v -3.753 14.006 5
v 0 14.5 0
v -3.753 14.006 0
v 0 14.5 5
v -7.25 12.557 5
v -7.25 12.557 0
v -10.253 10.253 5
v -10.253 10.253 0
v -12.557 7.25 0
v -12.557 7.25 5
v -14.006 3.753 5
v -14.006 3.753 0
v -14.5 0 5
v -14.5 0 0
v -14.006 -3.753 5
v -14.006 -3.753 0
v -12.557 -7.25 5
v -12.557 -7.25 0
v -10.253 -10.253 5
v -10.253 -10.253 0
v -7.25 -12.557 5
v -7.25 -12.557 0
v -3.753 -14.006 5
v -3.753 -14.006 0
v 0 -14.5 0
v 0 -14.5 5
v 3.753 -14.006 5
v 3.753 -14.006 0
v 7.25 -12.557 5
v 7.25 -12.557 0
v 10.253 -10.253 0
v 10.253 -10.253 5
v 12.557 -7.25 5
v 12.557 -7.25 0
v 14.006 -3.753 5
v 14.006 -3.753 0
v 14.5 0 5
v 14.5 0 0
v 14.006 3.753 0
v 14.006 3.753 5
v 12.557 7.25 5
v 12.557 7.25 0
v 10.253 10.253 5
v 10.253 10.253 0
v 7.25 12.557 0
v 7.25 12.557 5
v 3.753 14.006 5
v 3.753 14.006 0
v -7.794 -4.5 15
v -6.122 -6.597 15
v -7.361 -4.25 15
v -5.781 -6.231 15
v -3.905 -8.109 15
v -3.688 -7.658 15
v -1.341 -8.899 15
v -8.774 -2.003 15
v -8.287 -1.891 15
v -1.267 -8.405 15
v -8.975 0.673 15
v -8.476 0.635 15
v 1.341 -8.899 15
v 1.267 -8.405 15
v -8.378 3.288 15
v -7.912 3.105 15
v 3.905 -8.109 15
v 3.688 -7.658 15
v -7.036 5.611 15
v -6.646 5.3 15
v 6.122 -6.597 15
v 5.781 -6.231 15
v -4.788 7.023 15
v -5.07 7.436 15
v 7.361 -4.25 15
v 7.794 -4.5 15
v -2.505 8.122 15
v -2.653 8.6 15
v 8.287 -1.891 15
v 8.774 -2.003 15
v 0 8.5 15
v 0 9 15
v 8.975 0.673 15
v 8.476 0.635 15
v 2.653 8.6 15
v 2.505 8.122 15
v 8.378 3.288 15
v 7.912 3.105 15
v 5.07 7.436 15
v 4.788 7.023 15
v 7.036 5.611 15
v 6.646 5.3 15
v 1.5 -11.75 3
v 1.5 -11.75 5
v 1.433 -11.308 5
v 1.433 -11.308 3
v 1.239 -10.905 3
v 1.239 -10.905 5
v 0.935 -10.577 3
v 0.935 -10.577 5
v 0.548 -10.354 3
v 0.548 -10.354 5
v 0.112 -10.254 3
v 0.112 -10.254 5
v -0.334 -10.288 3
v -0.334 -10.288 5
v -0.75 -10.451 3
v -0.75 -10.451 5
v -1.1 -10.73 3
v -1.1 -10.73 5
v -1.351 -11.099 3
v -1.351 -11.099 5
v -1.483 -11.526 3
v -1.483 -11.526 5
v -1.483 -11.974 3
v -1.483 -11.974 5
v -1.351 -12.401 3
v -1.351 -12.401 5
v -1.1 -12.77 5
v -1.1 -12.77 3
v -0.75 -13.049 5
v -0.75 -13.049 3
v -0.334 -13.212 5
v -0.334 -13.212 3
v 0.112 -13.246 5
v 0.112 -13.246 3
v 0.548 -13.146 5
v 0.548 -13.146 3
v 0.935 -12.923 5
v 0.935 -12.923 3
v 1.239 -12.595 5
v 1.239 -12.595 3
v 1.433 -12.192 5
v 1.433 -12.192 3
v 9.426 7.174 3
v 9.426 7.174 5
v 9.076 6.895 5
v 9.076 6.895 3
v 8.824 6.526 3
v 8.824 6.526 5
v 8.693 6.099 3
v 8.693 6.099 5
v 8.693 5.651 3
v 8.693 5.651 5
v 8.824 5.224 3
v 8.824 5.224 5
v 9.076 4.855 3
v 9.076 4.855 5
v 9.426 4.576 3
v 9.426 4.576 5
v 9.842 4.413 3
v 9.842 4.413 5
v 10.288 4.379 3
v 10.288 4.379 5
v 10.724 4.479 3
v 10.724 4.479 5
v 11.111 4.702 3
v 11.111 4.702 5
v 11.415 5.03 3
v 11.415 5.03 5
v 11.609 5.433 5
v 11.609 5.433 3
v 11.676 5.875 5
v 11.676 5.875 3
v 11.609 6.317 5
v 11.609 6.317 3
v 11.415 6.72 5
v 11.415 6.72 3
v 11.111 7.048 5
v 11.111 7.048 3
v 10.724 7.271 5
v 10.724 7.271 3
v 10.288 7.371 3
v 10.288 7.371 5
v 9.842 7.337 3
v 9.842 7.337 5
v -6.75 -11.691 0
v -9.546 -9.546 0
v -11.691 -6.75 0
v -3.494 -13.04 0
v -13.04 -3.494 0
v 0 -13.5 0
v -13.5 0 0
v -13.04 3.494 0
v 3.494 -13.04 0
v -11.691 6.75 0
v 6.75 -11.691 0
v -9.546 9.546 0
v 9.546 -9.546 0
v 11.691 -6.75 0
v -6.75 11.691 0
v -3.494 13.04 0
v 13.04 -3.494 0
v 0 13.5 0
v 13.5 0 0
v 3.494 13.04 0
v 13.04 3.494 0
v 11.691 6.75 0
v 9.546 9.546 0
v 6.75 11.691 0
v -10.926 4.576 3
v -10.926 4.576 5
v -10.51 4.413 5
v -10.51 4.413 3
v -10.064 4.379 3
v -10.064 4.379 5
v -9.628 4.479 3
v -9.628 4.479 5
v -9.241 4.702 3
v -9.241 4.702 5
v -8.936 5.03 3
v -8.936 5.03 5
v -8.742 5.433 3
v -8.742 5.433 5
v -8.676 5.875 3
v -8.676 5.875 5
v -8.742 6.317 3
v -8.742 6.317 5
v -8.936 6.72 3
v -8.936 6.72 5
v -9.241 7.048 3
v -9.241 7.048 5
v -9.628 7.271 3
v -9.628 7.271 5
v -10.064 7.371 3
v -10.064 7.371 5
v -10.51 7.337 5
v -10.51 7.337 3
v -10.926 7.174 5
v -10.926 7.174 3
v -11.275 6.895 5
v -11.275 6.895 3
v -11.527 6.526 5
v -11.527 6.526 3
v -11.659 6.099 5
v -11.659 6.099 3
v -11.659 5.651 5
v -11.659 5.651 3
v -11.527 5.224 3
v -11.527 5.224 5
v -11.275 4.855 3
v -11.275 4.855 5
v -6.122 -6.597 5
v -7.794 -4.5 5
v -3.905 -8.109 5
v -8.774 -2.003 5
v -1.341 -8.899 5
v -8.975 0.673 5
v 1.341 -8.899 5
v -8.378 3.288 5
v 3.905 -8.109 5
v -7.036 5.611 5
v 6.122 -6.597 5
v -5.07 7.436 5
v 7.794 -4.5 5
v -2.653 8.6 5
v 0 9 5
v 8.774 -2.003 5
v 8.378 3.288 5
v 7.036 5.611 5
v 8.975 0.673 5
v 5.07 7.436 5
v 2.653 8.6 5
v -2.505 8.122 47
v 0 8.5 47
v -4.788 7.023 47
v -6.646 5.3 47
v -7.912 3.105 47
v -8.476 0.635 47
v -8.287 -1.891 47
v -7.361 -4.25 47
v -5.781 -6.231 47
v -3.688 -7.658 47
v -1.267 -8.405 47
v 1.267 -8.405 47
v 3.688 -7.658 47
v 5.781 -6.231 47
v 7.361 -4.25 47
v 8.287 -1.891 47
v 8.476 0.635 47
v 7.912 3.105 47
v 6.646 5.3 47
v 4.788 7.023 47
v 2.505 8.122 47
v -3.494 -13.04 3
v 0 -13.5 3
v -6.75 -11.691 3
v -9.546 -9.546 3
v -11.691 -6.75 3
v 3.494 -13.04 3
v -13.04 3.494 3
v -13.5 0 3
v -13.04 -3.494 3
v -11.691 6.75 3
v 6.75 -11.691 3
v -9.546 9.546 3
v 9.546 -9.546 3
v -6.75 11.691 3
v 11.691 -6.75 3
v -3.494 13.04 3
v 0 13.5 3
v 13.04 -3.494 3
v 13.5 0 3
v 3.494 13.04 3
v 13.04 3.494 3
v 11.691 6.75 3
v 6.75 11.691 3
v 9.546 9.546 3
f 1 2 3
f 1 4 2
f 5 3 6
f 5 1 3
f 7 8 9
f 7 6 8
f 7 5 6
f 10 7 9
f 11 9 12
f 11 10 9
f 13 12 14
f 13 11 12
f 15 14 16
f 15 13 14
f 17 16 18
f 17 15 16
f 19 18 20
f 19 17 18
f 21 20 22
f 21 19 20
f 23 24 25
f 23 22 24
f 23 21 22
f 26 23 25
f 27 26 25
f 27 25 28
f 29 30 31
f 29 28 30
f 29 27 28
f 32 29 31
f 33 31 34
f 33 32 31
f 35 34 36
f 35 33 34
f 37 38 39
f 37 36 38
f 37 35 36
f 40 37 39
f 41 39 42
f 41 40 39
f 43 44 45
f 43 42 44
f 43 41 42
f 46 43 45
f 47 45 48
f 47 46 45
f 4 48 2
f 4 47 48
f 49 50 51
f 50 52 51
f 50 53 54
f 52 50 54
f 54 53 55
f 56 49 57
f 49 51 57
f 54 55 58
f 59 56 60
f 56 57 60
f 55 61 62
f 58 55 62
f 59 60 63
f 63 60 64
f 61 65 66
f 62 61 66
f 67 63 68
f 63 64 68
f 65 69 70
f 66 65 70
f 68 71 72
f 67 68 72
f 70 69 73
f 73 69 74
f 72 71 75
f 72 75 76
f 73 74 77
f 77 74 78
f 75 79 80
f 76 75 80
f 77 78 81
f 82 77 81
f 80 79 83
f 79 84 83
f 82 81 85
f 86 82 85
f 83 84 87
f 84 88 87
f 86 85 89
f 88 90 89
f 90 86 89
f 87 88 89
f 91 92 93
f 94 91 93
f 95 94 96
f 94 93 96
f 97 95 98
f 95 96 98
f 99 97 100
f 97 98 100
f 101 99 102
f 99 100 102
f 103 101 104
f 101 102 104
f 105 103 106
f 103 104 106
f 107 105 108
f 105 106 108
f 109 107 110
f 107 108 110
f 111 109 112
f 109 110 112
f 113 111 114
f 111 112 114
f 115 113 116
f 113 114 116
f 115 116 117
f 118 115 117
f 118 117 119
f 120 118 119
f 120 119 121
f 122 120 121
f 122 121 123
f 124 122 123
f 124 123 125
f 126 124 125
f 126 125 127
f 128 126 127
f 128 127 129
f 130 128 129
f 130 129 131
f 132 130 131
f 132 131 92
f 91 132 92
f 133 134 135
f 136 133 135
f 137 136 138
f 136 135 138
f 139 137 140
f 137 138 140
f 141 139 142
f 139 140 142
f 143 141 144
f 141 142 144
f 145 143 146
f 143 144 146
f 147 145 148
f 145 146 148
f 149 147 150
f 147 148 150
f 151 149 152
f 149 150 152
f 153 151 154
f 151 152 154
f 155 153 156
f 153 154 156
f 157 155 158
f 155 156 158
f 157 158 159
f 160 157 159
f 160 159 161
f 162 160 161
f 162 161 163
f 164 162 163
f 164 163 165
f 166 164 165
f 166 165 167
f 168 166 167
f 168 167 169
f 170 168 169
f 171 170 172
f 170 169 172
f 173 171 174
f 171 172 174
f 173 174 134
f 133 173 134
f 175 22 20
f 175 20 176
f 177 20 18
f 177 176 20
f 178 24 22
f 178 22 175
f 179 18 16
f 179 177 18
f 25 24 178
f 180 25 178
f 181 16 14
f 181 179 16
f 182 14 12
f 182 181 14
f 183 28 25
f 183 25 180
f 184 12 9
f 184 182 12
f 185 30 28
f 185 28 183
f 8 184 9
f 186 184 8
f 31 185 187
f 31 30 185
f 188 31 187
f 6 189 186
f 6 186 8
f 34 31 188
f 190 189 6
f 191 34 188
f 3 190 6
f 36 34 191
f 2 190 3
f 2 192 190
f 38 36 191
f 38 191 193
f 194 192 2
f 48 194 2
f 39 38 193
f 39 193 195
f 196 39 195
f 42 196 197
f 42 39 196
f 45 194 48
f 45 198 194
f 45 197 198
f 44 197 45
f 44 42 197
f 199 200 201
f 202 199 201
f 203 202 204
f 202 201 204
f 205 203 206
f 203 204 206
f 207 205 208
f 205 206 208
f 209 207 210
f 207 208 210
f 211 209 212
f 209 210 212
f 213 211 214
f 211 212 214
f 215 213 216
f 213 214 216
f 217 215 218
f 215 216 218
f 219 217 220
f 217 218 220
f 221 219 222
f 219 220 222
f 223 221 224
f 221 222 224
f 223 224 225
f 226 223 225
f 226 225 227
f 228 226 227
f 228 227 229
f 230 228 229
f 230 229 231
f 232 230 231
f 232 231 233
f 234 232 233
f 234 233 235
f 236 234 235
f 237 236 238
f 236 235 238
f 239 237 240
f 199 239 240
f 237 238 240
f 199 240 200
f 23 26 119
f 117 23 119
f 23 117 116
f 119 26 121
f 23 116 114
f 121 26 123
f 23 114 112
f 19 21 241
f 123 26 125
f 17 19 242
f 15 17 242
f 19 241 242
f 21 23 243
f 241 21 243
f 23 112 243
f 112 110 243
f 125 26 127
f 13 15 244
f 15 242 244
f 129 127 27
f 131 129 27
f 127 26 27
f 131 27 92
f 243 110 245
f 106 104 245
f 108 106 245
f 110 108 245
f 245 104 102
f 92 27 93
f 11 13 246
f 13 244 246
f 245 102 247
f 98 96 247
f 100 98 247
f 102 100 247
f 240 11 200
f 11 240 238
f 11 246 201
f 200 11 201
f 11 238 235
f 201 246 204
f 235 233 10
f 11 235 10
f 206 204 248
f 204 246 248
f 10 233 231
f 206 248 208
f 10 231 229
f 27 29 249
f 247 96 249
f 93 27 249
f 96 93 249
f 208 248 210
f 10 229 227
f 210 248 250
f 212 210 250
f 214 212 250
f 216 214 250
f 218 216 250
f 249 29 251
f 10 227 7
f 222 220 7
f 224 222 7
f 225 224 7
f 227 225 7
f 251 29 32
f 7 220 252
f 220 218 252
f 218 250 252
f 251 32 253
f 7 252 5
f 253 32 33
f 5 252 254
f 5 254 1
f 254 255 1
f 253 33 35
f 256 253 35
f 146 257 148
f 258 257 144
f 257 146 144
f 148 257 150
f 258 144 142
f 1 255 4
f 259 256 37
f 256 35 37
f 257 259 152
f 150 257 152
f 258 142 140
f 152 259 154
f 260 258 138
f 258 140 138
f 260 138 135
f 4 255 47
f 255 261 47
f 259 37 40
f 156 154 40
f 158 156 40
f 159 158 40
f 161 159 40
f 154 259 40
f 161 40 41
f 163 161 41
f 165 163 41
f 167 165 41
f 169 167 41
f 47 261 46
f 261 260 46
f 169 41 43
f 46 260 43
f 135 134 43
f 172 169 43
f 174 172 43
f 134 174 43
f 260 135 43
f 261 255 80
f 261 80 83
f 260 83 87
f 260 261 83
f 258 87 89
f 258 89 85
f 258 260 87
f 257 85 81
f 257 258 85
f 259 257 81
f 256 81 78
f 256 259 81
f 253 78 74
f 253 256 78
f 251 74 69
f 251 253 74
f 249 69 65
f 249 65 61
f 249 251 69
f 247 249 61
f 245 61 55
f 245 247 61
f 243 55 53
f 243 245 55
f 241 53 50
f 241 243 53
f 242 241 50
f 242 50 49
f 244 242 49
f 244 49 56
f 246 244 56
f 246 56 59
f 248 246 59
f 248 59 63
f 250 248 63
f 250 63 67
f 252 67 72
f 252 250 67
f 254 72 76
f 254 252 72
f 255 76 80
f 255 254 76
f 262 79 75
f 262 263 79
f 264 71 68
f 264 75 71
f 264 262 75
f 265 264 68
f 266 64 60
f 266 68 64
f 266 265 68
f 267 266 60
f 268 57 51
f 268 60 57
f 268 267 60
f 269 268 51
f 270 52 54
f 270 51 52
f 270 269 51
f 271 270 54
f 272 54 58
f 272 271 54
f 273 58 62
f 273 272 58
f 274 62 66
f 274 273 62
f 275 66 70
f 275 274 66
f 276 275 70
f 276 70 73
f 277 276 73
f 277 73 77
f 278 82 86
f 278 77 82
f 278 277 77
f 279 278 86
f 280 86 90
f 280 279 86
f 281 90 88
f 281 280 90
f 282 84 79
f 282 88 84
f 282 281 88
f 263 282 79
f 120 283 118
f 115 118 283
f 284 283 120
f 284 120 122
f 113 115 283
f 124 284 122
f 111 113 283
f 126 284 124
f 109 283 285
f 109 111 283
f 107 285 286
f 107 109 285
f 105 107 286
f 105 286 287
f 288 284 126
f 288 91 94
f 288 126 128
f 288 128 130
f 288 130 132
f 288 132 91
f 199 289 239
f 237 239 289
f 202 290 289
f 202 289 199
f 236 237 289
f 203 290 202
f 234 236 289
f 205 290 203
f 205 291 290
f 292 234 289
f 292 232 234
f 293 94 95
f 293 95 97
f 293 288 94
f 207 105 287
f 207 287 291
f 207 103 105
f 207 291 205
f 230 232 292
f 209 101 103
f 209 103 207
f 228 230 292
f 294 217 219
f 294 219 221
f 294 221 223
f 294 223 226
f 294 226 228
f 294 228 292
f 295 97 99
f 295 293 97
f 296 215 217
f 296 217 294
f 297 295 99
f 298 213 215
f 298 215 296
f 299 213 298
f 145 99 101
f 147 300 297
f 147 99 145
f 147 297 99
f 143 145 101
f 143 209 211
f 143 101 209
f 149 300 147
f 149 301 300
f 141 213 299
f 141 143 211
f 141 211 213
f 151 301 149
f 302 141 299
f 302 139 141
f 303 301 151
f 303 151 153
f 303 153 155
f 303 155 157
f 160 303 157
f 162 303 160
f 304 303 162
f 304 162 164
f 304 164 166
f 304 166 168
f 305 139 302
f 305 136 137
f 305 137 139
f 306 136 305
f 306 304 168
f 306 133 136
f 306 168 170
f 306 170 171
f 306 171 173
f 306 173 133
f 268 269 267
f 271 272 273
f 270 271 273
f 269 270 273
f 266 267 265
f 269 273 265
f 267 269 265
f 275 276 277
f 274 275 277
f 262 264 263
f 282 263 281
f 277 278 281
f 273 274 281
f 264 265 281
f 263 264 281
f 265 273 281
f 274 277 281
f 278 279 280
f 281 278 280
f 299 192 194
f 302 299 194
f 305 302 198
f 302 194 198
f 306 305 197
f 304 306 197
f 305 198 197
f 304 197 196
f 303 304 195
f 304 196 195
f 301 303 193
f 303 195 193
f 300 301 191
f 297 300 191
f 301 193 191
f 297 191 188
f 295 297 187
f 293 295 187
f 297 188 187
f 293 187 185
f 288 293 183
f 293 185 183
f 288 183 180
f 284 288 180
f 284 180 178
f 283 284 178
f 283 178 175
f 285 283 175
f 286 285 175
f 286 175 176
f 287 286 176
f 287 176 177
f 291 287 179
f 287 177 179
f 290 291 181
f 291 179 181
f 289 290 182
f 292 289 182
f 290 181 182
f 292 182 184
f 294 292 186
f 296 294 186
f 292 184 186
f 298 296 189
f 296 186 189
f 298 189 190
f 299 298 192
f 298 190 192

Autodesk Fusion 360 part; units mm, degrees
sketch "Esquisse1" plane through (0, 0, 0) normal (1, 0, 0) x (0, 1, 0)
  line L0 (13.5, 3) -> (13.5, 0)
  line L1 (13.5, 0) -> (14.5, 0)
  line L2 (14.5, 0) -> (14.5, 5)
  line L3 (14.5, 5) -> (9, 5)
  line L4 (9, 15) -> (8.5, 15)
  line L5 (8.5, 15) -> (8.5, 47)
  line L6 (8.5, 47) -> (0, 47)
  line L7 (0, 47) -> (0, 3)
  line L8 (0, 3) -> (13.5, 3)
  line L9 (9, 15) -> (9, 5)
  dimension "d33" = 3
  dimension "d34" = 13.5
  dimension "d35" = 1
  dimension "d36" = 5
  dimension "d40" = 32
  dimension "d41" = 8.5
  dimension "d43" = 9
  dimension "d44" = 10
revolve "Révolution1" add sketch "Esquisse1" angle 360 about axis through (0, 0, 47) along (0, 0, -1)
sketch "Esquisse1 (2)" plane through (0, 0, 5) normal (0, 0, 1) x (-1, 0, 0)
sketch "Esquisse2" plane through (0, 0, 5) normal (0, 0, 1) x (1, 0, 0)
  circle A0 centre (0, 0) radius 11.75 construction
  circle A1 centre (0, -11.75) radius 1.5
  dimension "d57" = 23.5
  dimension "d58" = 3
extrude "Extrusion1" cut sketch "Esquisse2" against normal blind 4
pattern_circular "Réseau C1" count 3 over 360 about axis through (0, 0, 47) along (0, 0, -1) of "Extrusion1"
equation "d41 = ( 17 / 2 ) * 1 mm"
